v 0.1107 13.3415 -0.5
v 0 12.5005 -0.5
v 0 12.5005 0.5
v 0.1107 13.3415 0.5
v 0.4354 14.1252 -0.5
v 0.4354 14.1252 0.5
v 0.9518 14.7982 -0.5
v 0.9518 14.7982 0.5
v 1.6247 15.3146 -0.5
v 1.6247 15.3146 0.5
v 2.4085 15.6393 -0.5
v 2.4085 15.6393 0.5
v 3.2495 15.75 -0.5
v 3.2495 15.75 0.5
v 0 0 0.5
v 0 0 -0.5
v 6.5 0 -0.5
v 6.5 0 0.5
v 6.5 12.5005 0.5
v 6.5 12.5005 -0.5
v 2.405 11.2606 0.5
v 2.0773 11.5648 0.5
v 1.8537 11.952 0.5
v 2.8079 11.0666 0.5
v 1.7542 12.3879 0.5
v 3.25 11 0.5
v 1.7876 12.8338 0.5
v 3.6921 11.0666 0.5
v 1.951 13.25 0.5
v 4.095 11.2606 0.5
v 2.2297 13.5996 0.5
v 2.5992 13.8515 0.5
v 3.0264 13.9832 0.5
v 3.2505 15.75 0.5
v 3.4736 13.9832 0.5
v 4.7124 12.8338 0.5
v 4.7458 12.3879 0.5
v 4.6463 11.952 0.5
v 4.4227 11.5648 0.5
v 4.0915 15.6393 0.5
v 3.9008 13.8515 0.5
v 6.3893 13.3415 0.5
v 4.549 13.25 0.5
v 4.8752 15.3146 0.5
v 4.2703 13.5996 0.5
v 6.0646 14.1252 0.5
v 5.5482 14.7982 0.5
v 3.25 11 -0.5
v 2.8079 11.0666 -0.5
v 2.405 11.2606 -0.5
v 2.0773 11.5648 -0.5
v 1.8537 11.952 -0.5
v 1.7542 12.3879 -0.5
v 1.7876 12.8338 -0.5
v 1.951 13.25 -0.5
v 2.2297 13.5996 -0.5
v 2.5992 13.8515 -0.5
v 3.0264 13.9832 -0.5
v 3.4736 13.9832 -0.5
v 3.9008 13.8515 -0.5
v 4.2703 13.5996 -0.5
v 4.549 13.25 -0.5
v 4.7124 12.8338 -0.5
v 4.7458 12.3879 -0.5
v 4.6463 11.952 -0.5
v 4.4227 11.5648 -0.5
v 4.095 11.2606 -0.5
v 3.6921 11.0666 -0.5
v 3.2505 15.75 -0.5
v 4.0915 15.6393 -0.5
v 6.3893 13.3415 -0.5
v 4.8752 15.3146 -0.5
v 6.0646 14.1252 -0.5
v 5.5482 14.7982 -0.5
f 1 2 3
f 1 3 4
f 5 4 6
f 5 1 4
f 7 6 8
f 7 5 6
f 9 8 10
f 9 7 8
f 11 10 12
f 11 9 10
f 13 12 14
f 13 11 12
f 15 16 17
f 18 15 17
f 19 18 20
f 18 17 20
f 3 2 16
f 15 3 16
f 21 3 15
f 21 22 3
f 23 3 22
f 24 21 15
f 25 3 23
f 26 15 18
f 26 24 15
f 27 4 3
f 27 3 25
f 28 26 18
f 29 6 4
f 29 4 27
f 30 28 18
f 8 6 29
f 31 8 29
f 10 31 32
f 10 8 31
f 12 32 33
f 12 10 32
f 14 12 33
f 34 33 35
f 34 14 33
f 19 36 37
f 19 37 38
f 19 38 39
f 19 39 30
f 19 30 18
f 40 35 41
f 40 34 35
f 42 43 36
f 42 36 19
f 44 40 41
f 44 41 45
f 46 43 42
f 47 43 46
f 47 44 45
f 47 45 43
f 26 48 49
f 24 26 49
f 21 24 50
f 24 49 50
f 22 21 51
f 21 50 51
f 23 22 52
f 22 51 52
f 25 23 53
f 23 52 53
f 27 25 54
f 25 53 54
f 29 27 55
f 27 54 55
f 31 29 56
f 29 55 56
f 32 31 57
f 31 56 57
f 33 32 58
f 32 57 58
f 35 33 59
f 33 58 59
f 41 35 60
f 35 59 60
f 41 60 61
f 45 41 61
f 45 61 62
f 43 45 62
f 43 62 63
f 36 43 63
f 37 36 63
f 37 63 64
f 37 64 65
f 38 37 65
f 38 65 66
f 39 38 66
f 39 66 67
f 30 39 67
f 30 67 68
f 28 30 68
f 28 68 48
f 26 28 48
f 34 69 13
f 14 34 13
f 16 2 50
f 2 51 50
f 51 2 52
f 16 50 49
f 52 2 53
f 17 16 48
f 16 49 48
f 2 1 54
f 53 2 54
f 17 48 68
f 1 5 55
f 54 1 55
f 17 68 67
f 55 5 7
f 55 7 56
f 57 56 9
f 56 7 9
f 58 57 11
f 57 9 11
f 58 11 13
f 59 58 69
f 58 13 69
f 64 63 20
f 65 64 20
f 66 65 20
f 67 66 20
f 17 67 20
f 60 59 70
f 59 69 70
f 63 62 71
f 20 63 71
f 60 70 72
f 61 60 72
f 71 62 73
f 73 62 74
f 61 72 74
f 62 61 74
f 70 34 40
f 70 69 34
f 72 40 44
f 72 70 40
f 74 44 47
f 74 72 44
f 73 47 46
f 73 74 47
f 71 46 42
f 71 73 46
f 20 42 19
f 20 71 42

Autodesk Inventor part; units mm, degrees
ref_plane "YZ Plane" through (0, 0, 0) normal (1, 0, 0) x (0, 1, 0)
ref_plane "XZ Plane" through (0, 0, 0) normal (0, 1, 0) x (-1, 0, 0)
ref_plane "XY Plane" through (0, 0, 0) normal (0, 0, 1) x (1, 0, 0)
sketch "Szkic1" plane through (0, 0, 0) normal (0, 0, 1) x (1, 0, 0)
  line L0 (0, 0) -> (6.5, 0)
  line L1 (6.5, 0) -> (6.5, 15.75)
  line L2 (6.5, 15.75) -> (0, 15.75)
  line L3 (0, 15.75) -> (0, 0)
  point P0 (3.25, 12.5)
  dimension "d0" = 6.5
  dimension "d5" = 3.25
  dimension "d6" = 12.5
extrude "Wyciągnięcie proste1" add sketch "Szkic1" along normal mid plane 1
fillet "Zaokrąglenie1" radius 3.25 2 edges at (6.5, 15.75, 0) (0, 15.75, 0)
hole "Otwór1" at (3.25, 12.5, 0) direction (0, 0, -1) diameter 3 end through all both
properties part number "podporka_mala"
